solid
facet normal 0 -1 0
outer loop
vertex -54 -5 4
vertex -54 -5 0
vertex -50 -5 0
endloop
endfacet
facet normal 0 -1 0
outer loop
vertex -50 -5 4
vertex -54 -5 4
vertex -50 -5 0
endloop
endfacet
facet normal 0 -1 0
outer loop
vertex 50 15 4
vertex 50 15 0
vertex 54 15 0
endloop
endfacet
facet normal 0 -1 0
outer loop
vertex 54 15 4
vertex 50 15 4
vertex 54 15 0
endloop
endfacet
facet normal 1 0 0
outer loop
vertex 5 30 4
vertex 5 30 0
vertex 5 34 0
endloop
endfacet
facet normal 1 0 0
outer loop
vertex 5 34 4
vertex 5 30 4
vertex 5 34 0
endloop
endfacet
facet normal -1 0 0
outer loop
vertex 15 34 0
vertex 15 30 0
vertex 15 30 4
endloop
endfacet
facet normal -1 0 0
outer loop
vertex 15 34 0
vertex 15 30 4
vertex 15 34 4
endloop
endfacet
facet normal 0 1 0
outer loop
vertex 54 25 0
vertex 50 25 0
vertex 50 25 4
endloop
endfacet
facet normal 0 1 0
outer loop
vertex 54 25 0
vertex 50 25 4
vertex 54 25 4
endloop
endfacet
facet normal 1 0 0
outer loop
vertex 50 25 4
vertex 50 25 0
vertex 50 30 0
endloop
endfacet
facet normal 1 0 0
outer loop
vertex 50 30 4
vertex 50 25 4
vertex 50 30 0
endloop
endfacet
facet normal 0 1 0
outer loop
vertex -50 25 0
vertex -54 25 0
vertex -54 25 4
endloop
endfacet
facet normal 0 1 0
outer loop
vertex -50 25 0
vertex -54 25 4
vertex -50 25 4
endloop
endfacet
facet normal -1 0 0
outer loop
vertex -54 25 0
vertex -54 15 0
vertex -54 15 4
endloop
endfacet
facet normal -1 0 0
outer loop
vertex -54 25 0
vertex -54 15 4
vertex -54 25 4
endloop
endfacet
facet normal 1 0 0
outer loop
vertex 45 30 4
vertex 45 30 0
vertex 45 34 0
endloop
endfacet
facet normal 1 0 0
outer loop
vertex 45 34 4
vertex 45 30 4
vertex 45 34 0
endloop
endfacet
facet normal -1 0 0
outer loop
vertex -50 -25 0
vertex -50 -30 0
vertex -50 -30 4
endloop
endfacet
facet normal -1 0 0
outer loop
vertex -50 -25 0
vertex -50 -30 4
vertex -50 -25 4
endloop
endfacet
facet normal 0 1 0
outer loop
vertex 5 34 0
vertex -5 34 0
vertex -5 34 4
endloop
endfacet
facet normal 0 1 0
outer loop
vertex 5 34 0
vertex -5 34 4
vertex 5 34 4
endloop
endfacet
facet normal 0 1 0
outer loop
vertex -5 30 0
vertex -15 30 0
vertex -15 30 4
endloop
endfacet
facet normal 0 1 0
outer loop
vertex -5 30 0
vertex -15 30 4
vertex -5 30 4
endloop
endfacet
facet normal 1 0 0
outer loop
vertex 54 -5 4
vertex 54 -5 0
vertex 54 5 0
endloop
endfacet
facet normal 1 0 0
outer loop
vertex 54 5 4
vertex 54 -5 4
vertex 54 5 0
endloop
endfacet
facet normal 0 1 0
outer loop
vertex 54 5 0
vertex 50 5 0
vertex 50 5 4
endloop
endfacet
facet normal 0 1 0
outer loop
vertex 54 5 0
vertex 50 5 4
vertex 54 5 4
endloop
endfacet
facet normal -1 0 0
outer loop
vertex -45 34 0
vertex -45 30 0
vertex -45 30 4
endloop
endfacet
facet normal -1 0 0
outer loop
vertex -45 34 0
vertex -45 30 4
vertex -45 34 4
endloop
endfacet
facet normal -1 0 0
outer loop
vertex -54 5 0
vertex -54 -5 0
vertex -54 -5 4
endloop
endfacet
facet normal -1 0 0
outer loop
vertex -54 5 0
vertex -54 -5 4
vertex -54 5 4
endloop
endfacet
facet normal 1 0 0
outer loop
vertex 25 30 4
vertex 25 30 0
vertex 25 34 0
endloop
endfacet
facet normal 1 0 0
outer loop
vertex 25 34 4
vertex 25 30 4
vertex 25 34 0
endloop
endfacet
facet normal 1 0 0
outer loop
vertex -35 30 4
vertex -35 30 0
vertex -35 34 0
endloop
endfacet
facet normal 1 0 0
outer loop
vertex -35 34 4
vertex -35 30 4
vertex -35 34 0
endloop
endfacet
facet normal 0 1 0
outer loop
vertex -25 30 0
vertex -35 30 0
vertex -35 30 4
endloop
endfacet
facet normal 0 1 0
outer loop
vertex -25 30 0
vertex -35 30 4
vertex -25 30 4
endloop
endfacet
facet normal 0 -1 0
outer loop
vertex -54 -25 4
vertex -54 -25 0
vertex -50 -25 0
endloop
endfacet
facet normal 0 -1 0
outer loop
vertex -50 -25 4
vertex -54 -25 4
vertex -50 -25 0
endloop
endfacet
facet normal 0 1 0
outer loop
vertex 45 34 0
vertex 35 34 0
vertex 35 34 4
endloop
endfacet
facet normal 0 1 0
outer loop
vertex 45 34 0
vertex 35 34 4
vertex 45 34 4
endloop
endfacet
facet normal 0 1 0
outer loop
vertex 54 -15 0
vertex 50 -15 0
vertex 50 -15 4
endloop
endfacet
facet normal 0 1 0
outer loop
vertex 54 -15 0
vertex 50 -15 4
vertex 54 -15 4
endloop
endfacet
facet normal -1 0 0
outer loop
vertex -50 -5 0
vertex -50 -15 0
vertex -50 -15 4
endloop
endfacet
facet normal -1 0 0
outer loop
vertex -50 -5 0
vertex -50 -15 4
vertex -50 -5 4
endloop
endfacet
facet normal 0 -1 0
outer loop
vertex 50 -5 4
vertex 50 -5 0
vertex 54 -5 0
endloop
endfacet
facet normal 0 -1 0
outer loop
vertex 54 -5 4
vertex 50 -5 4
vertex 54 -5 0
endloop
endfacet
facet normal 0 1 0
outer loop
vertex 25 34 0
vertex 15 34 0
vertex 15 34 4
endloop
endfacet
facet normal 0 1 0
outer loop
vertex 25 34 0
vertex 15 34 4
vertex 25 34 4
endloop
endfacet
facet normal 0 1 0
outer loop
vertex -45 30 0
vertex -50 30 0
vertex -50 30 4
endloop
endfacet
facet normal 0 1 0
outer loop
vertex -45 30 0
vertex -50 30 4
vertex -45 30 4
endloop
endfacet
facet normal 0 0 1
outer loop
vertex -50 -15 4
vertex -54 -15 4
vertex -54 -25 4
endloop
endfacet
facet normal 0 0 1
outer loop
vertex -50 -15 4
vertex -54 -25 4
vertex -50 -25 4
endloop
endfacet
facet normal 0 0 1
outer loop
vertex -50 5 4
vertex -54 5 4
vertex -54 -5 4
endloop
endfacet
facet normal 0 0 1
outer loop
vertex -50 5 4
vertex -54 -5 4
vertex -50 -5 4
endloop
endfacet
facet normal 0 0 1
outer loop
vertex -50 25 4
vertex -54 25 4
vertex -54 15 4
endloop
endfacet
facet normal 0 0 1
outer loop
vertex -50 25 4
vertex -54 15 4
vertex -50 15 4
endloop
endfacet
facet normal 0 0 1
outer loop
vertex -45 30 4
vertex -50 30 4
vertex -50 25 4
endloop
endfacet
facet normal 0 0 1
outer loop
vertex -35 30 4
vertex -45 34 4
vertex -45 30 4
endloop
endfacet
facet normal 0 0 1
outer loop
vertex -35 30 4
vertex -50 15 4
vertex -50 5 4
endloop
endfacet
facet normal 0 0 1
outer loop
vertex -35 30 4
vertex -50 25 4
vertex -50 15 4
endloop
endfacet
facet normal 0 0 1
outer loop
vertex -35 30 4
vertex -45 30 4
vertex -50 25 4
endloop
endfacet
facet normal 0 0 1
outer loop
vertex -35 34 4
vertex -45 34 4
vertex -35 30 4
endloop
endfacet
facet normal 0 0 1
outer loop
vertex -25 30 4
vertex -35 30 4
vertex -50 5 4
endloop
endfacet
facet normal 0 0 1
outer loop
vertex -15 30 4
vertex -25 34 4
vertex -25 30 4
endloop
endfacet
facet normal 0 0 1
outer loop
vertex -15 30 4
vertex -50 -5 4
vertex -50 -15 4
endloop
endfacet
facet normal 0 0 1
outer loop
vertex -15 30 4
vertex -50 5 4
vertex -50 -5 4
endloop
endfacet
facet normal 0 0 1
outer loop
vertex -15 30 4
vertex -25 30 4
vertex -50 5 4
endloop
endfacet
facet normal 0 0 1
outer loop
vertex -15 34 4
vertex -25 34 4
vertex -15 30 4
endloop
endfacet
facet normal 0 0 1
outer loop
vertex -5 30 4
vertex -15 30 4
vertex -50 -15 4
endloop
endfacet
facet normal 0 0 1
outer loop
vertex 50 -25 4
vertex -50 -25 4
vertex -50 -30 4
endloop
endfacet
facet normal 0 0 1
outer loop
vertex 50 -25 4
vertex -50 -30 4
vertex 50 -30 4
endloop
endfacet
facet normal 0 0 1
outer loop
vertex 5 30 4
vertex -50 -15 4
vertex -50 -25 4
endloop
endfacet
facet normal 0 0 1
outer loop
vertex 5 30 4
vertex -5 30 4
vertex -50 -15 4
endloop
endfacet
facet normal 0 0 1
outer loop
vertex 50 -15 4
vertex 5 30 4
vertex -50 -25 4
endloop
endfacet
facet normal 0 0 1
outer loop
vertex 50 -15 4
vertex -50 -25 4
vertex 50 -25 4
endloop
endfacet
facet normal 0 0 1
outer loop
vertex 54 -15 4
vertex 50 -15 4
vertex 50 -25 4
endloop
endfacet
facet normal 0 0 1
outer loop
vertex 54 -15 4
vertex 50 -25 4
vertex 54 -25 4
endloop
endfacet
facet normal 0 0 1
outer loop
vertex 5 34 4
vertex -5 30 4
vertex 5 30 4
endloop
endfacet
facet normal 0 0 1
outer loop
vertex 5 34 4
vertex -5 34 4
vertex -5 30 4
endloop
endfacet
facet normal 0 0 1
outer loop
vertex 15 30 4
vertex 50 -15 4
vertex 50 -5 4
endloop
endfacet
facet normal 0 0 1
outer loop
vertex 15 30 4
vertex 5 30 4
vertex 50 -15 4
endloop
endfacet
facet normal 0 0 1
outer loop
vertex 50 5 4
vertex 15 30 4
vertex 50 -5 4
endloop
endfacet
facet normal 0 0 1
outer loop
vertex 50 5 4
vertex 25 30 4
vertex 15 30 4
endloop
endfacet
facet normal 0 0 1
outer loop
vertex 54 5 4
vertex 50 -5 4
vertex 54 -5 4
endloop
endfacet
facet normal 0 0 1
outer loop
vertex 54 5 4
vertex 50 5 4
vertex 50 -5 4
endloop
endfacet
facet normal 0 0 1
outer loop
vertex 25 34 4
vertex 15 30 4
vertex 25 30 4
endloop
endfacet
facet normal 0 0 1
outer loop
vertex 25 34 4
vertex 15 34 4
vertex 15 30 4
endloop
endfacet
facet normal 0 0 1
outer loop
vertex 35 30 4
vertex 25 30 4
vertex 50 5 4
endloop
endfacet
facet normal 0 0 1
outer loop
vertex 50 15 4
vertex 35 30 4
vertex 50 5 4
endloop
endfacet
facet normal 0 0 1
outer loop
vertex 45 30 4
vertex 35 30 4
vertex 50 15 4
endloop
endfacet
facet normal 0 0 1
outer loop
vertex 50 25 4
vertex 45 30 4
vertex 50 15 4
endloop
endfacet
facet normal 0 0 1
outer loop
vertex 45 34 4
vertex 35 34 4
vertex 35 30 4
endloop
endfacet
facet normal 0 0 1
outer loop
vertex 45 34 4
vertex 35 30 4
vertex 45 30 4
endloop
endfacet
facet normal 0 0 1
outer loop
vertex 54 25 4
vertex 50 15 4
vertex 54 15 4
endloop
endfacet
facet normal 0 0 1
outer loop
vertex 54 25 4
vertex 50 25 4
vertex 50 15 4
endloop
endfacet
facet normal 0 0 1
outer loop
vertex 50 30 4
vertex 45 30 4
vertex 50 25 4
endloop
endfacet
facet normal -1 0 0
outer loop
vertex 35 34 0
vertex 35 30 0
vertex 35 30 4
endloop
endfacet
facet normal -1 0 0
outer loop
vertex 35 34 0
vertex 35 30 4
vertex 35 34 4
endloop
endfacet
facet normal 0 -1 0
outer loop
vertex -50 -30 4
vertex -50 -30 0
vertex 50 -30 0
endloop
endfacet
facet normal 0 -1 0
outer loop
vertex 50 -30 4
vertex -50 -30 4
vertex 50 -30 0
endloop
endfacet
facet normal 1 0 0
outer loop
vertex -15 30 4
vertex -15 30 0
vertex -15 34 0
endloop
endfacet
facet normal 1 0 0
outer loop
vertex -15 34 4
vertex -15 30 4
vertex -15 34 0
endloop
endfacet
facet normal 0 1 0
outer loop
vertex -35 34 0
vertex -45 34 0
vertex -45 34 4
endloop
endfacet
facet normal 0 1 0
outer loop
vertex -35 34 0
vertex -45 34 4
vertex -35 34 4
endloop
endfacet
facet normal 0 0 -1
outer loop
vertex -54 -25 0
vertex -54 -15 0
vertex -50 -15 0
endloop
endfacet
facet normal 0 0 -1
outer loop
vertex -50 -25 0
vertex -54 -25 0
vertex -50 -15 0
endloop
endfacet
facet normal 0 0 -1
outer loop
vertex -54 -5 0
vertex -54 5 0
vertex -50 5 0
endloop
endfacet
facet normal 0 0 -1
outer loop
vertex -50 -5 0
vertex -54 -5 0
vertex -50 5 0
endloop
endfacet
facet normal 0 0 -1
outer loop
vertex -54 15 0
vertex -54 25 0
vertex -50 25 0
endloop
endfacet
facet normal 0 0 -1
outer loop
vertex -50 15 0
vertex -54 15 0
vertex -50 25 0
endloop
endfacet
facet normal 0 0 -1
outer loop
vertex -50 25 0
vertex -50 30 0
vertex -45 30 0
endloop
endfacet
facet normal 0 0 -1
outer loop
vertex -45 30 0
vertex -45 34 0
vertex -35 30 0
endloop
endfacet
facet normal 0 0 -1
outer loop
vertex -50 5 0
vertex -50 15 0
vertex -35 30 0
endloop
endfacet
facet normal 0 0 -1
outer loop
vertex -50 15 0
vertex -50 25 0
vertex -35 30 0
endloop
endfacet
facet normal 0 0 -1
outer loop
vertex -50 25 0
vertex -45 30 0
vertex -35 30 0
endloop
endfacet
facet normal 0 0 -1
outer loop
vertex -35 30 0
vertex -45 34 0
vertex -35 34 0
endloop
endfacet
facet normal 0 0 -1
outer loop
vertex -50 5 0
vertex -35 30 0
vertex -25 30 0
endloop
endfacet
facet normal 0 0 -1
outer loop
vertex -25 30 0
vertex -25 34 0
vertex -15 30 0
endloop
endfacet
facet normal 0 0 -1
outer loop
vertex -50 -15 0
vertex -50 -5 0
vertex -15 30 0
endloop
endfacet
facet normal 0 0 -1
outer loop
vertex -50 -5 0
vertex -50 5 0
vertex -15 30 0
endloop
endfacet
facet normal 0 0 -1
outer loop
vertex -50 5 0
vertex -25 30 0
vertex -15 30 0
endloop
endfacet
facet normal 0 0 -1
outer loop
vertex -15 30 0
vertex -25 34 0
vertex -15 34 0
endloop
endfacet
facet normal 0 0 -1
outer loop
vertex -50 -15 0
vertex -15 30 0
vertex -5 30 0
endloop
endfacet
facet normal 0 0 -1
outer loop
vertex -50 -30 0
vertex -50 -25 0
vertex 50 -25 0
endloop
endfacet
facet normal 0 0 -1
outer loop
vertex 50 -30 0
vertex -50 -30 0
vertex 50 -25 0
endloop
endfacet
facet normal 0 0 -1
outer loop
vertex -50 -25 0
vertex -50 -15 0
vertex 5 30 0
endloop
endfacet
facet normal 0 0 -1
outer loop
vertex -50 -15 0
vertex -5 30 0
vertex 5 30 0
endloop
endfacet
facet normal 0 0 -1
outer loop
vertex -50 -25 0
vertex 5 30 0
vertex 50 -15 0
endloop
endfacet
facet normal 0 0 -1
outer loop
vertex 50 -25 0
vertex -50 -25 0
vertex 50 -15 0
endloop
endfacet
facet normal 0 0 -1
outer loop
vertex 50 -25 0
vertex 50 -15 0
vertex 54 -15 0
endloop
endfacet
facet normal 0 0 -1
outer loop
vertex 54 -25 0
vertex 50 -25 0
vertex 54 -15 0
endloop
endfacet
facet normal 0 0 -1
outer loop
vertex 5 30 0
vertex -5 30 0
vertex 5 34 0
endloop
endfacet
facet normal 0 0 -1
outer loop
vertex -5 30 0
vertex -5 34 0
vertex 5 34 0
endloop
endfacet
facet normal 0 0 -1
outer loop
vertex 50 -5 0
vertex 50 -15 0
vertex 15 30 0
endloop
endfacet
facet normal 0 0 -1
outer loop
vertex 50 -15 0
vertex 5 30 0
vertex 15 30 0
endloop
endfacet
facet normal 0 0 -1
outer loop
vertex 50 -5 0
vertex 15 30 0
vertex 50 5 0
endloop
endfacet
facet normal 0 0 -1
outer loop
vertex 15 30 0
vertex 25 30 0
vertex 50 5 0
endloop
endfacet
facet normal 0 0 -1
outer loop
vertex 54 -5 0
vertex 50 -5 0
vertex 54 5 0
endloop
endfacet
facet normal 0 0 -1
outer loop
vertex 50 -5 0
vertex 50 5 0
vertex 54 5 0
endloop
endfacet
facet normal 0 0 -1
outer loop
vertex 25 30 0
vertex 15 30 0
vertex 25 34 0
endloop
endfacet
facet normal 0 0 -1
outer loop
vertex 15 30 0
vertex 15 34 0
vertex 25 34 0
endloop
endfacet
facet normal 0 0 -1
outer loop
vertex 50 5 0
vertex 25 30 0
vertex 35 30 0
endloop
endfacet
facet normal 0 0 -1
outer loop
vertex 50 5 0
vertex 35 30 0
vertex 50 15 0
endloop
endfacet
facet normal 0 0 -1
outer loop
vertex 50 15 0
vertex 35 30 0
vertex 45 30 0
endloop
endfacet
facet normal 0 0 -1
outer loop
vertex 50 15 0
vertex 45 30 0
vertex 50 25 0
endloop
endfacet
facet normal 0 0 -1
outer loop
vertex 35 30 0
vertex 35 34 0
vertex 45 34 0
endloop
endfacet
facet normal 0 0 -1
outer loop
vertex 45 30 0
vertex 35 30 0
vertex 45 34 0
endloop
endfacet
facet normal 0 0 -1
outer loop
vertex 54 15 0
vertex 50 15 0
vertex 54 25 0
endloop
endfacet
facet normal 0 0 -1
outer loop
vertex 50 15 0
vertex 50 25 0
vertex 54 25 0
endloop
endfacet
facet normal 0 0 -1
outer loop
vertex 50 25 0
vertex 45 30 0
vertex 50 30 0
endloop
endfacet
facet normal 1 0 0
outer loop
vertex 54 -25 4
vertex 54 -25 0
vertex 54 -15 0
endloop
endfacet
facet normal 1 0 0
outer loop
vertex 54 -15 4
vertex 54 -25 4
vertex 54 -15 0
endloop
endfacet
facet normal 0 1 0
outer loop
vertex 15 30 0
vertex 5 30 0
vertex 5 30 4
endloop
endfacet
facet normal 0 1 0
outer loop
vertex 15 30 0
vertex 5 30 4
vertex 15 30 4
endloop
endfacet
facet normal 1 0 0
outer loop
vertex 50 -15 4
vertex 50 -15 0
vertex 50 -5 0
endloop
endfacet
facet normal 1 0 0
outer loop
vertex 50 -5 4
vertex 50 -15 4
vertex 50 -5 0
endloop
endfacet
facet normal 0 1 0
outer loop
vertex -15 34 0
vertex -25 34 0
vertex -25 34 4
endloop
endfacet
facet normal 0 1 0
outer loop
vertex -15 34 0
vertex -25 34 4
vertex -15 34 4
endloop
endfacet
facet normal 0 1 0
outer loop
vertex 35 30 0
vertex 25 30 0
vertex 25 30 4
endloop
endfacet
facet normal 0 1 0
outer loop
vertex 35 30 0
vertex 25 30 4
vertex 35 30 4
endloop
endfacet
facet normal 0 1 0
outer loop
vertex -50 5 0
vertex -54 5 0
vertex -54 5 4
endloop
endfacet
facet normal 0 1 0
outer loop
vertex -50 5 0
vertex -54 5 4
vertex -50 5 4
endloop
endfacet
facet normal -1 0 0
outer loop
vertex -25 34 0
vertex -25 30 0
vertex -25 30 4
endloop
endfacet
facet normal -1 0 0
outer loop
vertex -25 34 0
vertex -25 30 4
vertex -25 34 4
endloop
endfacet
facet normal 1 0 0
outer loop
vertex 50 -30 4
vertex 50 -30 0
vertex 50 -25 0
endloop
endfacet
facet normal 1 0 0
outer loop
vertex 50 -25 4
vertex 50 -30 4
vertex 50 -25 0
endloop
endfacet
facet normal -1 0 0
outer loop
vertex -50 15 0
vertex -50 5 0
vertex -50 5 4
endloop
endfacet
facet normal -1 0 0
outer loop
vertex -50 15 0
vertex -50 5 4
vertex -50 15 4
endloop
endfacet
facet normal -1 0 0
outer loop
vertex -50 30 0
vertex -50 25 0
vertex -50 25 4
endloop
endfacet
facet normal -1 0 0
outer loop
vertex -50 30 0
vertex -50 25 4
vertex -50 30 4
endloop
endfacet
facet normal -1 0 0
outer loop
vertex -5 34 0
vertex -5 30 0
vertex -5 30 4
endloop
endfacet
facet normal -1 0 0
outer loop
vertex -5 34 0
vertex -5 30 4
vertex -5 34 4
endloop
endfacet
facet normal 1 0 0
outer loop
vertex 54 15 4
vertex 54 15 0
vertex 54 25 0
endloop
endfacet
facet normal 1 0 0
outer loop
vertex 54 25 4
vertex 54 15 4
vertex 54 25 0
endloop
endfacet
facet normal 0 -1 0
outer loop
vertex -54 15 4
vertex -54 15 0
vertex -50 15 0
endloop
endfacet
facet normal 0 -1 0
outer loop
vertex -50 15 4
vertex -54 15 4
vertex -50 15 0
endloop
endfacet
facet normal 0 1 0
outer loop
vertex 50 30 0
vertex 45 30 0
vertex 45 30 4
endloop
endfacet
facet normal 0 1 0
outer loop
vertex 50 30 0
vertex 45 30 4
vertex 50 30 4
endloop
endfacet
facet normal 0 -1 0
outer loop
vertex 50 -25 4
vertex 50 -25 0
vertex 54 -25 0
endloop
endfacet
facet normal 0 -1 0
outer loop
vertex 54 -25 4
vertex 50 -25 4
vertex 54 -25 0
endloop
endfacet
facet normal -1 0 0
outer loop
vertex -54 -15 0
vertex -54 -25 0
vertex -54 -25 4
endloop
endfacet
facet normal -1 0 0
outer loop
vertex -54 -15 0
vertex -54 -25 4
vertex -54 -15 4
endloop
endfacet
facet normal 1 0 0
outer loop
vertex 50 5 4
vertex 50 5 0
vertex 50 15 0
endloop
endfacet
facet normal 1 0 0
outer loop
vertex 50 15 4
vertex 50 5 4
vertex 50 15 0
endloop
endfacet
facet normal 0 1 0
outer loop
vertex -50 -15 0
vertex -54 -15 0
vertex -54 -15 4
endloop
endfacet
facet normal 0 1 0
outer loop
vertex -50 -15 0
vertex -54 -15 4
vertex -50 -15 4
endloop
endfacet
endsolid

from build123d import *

# Parameters (mm, degrees)
SKETCH1_W           = 100
SKETCH1_H           = 60
SKETCH1_W_2         = 10
SKETCH1_H_2         = 8
SKETCH1_W_3         = 8
SKETCH1_H_3         = 10
BOSS_EXTRUDE1_DEPTH = 4


with BuildPart() as part:
    # Sketch1 → Boss-Extrude1 (new body)
    with BuildSketch(Plane.XY):
        Rectangle(SKETCH1_W, SKETCH1_H)
        with Locations((-40, 30)):
            Rectangle(SKETCH1_W_2, SKETCH1_H_2)
        with Locations((-20, 30)):
            Rectangle(SKETCH1_W_2, SKETCH1_H_2)
        with Locations((0, 30)):
            Rectangle(SKETCH1_W_2, SKETCH1_H_2)
        with Locations((20, 30)):
            Rectangle(SKETCH1_W_2, SKETCH1_H_2)
        with Locations((40, 30)):
            Rectangle(SKETCH1_W_2, SKETCH1_H_2)
        with Locations((50, 20)):
            Rectangle(SKETCH1_W_3, SKETCH1_H_3)
        with Locations((50, 0)):
            Rectangle(SKETCH1_W_3, SKETCH1_H_3)
        with Locations((50, -20)):
            Rectangle(SKETCH1_W_3, SKETCH1_H_3)
        with Locations((-50, 20)):
            Rectangle(SKETCH1_W_3, SKETCH1_H_3)
        with Locations((-50, 0)):
            Rectangle(SKETCH1_W_3, SKETCH1_H_3)
        with Locations((-50, -20)):
            Rectangle(SKETCH1_W_3, SKETCH1_H_3)
    extrude(amount=BOSS_EXTRUDE1_DEPTH)


solid = part.part
